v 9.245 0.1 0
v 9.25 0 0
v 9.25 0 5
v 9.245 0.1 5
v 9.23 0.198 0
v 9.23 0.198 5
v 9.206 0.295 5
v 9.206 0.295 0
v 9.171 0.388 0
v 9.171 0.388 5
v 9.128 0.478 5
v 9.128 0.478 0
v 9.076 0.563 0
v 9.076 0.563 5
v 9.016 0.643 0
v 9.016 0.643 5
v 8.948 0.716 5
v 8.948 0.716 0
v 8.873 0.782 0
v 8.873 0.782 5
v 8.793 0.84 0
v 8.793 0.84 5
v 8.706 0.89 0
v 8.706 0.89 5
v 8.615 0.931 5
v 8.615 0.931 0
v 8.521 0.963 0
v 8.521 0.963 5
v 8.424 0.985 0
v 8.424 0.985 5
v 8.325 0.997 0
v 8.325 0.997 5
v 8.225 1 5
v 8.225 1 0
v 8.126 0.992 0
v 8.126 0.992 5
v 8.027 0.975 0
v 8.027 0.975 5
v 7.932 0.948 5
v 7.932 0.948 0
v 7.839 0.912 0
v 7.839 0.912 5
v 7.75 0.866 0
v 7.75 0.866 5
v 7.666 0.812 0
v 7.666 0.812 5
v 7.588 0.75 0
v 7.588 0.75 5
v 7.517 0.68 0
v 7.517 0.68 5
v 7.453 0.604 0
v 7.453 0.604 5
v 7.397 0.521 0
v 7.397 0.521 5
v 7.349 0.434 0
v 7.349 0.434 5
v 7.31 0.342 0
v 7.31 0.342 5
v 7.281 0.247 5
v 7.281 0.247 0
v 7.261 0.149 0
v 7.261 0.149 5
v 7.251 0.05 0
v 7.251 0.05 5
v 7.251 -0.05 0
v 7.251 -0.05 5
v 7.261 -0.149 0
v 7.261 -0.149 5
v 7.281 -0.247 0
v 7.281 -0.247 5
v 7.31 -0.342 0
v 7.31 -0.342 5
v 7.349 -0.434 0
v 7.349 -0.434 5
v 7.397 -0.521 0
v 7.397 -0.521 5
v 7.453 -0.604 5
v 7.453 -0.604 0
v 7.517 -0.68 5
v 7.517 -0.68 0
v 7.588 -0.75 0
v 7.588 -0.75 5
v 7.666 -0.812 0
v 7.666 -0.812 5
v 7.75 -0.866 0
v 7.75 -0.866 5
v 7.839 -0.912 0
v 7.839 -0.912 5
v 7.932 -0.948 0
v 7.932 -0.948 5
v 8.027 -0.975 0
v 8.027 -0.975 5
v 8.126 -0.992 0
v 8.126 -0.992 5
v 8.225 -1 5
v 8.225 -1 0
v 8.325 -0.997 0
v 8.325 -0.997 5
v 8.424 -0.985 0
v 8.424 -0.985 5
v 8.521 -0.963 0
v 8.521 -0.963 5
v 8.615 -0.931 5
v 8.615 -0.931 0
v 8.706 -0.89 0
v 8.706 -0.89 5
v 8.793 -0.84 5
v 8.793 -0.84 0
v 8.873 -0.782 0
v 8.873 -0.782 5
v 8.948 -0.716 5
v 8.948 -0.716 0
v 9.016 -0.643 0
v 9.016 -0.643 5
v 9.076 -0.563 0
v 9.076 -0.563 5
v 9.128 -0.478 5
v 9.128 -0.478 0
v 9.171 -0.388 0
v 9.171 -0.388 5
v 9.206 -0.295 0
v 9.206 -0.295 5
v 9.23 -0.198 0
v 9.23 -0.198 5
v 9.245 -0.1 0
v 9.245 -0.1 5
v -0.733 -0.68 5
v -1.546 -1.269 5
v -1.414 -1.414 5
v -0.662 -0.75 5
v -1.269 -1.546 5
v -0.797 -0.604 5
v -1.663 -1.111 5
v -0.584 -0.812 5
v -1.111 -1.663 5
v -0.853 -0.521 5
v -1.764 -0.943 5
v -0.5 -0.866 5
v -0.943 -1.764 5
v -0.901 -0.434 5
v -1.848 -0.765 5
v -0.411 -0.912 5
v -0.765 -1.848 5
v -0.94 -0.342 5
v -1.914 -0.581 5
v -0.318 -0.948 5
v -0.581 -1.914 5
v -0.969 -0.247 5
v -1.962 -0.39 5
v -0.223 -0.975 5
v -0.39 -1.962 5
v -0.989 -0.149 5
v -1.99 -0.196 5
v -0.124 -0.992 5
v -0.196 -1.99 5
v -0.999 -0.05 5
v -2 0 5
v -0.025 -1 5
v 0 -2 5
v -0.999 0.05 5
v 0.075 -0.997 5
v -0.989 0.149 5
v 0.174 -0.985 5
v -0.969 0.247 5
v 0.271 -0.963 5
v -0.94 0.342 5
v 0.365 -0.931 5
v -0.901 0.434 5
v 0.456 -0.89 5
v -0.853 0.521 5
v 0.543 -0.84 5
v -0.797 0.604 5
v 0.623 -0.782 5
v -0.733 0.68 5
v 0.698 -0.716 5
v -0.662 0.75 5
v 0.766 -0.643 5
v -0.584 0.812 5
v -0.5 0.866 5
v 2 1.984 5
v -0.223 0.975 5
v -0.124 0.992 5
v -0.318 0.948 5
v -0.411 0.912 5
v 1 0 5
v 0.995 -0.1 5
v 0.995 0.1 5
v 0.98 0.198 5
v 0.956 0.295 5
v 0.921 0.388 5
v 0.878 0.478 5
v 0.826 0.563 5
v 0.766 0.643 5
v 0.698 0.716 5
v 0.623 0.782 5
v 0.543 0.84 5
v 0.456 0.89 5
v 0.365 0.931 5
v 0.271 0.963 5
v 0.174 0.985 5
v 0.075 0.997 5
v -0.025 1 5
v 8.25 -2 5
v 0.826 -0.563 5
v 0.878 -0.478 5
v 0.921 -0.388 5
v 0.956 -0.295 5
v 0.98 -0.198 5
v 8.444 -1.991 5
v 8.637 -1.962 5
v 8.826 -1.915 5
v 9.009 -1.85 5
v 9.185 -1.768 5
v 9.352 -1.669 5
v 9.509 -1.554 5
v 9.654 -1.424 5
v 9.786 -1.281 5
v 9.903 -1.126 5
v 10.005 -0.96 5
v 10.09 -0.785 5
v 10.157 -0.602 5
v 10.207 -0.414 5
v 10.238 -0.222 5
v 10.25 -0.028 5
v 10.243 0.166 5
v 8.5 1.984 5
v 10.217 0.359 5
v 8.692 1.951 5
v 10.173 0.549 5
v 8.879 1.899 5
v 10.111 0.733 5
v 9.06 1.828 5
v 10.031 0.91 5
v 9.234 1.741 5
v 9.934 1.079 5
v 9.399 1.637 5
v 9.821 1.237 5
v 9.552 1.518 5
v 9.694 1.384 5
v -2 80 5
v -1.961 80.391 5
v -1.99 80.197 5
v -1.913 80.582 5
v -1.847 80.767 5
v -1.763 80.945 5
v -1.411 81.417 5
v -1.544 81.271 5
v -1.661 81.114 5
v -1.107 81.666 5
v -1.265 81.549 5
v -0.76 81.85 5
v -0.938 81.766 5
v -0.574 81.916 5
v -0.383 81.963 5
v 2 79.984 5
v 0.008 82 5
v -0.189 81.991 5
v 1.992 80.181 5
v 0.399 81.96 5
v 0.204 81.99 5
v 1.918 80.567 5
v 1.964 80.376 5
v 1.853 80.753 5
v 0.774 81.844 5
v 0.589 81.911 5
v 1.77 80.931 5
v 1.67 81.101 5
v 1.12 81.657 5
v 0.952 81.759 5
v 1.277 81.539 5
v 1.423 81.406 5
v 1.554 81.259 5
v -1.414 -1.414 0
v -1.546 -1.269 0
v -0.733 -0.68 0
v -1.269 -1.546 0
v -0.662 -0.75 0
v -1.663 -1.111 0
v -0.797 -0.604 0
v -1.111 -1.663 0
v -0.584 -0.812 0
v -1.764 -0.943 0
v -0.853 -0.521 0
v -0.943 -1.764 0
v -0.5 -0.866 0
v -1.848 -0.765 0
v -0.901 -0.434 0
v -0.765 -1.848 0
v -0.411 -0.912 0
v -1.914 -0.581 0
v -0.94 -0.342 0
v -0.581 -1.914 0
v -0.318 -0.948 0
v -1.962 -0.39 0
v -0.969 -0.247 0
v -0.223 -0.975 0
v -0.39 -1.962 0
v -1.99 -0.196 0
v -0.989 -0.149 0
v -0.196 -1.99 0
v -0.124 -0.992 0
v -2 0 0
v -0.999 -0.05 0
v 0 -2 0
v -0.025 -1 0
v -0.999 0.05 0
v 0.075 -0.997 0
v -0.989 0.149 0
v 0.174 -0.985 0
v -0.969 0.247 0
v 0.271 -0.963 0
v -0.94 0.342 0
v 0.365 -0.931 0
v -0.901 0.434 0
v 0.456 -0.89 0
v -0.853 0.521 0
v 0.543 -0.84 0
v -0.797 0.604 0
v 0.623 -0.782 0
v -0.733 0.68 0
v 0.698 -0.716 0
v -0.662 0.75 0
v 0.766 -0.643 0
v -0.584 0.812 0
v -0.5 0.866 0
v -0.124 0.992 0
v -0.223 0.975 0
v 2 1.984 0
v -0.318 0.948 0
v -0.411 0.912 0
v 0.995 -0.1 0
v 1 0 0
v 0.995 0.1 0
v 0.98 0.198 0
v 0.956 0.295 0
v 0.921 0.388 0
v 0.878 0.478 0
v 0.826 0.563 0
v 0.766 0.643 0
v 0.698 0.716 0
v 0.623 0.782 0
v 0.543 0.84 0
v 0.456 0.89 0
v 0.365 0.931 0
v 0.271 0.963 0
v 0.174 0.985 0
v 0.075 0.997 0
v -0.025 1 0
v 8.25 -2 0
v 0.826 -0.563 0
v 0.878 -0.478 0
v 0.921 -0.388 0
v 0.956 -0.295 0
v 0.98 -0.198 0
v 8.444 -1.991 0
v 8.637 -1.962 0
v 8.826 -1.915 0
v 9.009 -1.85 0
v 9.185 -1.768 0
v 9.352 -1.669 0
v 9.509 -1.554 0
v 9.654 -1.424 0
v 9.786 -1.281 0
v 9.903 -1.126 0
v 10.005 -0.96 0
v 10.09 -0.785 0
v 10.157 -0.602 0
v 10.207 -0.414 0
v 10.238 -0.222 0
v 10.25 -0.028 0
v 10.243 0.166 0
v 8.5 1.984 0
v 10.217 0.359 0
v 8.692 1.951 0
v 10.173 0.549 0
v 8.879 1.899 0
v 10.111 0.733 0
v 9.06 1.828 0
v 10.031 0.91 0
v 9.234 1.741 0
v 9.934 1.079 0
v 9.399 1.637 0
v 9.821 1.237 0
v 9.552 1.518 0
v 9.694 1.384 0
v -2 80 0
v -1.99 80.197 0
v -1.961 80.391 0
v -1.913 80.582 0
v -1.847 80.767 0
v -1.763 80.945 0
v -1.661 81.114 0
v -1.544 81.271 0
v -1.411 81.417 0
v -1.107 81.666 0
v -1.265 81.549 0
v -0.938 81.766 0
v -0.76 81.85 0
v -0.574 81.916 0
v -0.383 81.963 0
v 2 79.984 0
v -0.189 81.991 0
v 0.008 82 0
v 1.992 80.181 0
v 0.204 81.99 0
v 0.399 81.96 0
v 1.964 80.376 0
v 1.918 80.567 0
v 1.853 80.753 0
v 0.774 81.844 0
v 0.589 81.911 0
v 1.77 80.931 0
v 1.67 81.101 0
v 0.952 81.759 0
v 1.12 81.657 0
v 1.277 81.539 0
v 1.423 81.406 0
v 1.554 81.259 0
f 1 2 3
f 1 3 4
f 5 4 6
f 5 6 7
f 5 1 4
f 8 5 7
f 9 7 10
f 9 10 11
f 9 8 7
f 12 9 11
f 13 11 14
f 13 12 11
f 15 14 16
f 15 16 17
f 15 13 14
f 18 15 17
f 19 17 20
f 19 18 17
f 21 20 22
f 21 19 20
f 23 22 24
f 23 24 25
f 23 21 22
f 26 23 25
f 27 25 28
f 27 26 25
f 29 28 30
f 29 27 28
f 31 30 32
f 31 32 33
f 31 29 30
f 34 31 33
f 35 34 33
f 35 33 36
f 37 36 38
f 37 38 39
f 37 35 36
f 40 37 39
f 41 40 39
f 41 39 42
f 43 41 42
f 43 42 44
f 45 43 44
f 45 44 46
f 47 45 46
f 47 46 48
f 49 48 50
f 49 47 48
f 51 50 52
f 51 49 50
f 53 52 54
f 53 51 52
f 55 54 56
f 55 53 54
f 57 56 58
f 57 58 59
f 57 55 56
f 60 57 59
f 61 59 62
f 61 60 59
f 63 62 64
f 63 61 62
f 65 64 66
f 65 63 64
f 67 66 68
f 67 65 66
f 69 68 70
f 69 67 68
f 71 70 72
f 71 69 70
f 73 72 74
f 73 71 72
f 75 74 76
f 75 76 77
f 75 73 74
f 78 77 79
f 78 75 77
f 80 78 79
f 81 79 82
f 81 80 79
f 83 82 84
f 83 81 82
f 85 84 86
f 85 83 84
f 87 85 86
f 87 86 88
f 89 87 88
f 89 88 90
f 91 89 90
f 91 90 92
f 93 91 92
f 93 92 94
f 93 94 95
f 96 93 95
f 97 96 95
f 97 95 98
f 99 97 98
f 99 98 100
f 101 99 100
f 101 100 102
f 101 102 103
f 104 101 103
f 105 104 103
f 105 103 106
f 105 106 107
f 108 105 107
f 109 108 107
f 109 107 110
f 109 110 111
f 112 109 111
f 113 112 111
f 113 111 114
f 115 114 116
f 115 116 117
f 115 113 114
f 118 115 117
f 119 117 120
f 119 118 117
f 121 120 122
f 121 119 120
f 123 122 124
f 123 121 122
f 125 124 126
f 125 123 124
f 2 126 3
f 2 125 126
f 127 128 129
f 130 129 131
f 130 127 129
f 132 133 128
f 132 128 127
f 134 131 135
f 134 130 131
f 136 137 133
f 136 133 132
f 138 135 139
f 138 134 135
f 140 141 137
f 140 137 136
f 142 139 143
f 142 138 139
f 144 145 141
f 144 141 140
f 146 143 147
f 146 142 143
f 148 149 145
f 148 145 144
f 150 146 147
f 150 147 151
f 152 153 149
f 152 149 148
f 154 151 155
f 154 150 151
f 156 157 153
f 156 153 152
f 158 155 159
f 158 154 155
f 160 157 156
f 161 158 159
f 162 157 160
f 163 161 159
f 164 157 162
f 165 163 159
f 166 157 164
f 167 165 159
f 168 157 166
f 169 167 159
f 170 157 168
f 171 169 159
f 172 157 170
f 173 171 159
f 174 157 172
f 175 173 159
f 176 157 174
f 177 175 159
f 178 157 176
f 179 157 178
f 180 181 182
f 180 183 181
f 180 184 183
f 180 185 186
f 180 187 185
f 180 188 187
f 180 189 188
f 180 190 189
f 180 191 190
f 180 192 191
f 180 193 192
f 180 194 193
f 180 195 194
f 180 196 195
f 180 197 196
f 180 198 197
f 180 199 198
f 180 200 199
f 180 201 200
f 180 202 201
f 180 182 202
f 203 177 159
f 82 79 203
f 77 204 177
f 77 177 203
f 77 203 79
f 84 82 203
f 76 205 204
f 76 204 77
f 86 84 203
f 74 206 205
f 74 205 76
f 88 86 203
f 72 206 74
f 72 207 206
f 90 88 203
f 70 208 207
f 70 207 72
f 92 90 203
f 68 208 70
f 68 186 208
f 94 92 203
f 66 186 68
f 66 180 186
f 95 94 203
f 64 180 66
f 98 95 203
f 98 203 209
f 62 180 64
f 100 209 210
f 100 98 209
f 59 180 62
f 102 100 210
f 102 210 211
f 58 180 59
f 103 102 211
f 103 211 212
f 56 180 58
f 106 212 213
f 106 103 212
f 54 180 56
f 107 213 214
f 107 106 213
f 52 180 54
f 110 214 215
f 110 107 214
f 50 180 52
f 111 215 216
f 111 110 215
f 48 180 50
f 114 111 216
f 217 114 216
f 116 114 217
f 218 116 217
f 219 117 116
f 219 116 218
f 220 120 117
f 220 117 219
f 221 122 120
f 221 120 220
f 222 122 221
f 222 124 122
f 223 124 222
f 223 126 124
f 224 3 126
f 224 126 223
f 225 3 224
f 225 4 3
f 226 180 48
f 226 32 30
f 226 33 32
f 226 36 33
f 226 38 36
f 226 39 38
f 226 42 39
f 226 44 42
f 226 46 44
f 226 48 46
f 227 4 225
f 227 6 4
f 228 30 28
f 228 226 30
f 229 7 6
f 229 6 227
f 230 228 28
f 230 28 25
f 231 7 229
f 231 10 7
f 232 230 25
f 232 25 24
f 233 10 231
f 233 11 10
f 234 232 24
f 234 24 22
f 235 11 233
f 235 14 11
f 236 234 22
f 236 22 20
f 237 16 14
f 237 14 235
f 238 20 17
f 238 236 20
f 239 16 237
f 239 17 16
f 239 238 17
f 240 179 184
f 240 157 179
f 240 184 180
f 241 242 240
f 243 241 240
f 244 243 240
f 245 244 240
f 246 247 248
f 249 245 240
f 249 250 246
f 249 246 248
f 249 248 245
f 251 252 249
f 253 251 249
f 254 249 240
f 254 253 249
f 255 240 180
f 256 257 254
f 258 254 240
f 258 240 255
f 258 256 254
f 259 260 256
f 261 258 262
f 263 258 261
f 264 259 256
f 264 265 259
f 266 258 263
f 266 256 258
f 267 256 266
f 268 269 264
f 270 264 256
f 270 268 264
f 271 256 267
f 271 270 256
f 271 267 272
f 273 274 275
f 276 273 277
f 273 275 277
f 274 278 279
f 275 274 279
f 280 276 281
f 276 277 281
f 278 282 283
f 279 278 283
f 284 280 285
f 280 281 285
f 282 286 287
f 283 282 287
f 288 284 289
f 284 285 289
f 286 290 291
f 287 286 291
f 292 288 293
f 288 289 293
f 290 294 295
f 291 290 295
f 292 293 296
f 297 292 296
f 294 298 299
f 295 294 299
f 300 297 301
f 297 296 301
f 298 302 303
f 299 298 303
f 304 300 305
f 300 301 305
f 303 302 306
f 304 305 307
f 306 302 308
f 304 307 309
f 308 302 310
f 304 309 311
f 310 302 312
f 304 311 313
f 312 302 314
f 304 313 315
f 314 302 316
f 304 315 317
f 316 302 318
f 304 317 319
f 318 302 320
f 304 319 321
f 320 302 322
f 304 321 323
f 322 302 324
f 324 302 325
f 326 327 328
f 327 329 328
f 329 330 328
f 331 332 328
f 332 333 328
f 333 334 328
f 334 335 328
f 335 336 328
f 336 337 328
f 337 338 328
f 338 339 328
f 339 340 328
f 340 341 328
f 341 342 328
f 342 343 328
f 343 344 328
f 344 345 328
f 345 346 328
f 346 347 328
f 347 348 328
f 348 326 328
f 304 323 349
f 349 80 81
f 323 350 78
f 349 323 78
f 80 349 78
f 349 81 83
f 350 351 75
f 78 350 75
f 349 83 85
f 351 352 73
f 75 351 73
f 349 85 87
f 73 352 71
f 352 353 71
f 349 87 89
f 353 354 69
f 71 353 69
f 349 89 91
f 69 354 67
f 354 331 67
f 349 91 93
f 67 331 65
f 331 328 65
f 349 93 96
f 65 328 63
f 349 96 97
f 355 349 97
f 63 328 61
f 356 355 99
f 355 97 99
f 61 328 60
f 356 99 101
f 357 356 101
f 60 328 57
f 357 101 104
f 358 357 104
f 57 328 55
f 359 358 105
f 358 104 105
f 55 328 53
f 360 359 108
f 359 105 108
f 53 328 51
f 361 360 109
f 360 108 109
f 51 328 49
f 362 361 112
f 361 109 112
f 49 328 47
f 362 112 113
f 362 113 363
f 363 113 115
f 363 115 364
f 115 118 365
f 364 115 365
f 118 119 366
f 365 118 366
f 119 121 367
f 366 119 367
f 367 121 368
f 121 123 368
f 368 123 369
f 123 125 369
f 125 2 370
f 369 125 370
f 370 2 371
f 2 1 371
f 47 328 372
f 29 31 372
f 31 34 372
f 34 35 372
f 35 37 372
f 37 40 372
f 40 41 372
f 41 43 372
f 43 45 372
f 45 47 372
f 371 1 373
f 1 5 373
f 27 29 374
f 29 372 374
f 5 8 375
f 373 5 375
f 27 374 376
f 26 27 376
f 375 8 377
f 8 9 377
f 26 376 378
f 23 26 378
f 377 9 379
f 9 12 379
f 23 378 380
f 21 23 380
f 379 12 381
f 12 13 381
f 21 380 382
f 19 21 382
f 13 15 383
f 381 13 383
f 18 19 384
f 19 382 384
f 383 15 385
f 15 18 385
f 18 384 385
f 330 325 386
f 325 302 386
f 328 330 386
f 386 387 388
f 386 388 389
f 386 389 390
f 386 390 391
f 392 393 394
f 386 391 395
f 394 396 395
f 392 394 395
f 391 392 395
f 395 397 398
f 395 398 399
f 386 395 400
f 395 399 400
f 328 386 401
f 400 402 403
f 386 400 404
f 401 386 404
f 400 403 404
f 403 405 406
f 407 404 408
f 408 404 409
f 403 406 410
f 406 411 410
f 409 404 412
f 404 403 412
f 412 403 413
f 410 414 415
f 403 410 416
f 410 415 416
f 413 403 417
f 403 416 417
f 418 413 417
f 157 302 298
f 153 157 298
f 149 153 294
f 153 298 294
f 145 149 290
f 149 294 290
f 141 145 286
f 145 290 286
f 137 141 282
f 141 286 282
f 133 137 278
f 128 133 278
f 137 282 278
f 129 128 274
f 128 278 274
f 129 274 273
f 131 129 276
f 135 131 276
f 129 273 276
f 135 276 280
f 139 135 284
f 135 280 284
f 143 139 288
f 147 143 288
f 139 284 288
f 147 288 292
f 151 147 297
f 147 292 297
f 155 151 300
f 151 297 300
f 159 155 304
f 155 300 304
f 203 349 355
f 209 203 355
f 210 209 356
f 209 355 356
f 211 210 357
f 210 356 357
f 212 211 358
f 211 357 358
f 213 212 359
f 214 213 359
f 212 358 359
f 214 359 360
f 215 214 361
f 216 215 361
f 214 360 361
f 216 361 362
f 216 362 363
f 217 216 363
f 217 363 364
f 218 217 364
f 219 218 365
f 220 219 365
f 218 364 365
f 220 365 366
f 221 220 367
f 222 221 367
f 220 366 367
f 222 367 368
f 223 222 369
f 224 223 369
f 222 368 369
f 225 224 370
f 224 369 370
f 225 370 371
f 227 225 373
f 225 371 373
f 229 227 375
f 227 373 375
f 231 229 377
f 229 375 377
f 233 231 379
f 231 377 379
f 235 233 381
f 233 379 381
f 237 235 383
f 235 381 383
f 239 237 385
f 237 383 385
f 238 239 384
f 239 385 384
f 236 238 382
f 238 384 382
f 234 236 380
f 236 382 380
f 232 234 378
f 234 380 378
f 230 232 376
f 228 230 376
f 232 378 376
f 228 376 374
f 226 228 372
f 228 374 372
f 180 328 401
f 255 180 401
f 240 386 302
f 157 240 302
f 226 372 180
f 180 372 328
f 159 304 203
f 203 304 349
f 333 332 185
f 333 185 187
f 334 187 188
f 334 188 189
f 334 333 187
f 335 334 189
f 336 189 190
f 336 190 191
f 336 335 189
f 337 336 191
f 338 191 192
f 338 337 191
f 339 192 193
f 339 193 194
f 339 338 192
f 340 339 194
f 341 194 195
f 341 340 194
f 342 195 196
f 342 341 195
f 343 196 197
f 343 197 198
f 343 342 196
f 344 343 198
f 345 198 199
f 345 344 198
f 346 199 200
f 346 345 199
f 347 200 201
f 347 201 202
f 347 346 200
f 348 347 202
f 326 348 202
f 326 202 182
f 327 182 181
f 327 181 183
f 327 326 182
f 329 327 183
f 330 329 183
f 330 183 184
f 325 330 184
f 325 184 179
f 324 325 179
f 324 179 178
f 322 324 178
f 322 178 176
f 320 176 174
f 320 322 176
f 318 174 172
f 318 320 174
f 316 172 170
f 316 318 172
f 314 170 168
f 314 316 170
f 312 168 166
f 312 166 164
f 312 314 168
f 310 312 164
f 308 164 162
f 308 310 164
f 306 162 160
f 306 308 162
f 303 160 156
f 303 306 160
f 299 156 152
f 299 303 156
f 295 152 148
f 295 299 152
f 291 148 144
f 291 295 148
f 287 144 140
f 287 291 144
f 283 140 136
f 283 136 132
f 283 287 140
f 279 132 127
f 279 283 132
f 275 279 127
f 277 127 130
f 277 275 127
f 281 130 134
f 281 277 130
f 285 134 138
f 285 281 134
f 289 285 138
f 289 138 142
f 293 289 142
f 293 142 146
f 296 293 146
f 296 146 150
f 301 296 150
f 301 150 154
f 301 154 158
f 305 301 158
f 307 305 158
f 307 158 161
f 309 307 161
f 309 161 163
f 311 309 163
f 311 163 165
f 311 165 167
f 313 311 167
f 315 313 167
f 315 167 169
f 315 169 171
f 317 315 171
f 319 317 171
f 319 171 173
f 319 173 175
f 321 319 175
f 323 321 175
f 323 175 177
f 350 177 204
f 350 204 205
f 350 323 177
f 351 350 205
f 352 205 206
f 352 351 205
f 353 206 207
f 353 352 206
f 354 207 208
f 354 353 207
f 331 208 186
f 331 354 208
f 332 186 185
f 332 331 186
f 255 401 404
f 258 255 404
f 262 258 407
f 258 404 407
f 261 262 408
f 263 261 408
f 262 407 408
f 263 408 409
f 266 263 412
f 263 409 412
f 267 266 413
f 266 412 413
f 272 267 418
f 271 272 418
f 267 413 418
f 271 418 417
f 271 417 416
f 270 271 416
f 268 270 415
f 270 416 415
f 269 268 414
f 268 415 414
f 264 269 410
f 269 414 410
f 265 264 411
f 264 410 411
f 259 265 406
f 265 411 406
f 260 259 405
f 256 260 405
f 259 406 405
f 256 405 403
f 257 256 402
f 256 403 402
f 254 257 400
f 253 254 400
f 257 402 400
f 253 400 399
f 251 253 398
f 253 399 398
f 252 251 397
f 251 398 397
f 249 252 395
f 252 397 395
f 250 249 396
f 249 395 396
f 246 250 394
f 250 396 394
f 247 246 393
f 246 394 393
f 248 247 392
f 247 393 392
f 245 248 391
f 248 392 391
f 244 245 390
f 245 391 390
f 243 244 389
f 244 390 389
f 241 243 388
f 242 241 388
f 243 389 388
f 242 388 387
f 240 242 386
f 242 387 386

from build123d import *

# Parameters (mm, degrees)
SKETCH_1_R      = 1
EXTRUDE_1_DEPTH = 5


with BuildPart() as part:
    # 草图1 → 凸台-拉伸1 (new body)
    with BuildSketch(Plane.XY):
        with BuildLine():
            Line((-2, 80), (-2, 0))
            ThreePointArc((-2, 0), (-1.414213562, -1.414213562), (0, -2))
            Line((0, -2), (8.25, -2))
            ThreePointArc((8.25, -2), (10.246076458, -0.125214915), (8.499938543, 1.984321225))
            Line((8.499938543, 1.984321225), (1.999938543, 1.984321225))
            Line((1.999938543, 1.984321225), (1.999938543, 79.984321225))
            ThreePointArc((1.999938543, 79.984321225), (0.007839448, 81.999984636), (-2, 80))
        make_face()
        Circle(SKETCH_1_R, mode=Mode.SUBTRACT)
        with Locations((8.25, 0)):
            Circle(SKETCH_1_R, mode=Mode.SUBTRACT)
    extrude(amount=EXTRUDE_1_DEPTH)


solid = part.part
